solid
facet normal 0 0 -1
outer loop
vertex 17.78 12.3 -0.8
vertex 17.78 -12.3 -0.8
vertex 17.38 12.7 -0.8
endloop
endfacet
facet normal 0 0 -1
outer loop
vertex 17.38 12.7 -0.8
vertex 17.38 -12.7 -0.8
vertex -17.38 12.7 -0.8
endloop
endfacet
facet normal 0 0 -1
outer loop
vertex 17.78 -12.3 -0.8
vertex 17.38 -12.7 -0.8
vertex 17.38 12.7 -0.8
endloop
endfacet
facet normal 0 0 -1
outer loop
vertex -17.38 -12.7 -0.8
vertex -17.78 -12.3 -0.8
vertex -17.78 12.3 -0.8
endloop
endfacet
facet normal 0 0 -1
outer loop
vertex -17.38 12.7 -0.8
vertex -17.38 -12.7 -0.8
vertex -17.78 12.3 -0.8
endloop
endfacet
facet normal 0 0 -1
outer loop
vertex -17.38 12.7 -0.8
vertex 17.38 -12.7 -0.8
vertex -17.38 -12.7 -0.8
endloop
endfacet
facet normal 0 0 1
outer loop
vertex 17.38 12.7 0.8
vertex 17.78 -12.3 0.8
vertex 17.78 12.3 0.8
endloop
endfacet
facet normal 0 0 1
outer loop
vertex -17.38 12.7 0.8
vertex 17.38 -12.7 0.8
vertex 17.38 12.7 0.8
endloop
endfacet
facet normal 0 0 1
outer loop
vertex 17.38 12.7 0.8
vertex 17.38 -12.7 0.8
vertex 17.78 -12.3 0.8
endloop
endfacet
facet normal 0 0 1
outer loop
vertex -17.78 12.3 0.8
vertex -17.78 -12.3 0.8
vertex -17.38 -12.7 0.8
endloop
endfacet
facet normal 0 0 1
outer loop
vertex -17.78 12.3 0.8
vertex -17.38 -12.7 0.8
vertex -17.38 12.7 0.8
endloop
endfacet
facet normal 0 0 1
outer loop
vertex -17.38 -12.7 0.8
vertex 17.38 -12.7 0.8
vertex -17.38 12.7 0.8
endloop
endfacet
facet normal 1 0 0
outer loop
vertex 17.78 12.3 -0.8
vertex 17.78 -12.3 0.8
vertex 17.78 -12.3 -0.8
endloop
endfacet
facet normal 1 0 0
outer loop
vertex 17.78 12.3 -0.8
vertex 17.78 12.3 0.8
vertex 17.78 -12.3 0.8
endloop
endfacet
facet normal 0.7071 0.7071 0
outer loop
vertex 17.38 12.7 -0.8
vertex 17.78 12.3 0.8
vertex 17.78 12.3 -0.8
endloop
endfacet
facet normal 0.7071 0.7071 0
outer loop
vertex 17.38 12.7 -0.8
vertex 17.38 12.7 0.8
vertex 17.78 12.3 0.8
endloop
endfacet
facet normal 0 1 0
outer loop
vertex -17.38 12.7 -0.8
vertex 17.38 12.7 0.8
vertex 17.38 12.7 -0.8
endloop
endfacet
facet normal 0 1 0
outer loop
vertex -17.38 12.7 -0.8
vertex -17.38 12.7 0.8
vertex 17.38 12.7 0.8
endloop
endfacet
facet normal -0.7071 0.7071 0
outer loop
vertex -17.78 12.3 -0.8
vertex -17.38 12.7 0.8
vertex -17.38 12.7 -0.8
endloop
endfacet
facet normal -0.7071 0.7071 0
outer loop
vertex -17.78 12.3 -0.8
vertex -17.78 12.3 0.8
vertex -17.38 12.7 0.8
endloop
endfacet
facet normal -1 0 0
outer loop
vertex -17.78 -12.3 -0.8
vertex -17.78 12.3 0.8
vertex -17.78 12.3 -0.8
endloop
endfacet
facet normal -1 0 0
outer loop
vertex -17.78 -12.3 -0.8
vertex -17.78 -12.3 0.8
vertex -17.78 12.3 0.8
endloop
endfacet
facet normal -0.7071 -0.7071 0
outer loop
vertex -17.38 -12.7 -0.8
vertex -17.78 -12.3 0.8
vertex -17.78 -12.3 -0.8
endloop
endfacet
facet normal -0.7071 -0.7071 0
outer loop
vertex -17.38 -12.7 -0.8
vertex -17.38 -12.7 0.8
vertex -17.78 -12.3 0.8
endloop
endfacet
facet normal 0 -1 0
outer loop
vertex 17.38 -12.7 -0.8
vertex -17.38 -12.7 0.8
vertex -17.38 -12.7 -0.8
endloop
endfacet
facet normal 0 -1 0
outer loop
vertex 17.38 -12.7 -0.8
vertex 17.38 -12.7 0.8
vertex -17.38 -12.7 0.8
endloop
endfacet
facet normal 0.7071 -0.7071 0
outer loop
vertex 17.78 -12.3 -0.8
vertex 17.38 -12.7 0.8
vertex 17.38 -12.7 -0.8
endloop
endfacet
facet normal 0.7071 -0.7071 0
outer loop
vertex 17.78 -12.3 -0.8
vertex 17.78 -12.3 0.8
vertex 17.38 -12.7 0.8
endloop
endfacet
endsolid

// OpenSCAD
// PCB: 35.56mm x 25.4mm x 1.6mm (single connected solid)
$fn = 64;

pcb_length    = 35.56;
pcb_width     = 25.4;
pcb_thickness = 1.6;

// Small edge chamfer to make the slab visibly "PCB-like" while keeping exact overall size
chamfer = 0.4; // mm (kept small vs thickness)

module pcb_blank(L, W, T, c) {
    // 2D profile with chamfered corners, then extrude to thickness
    linear_extrude(height=T, center=true)
        polygon(points=[
            [ -L/2 + c, -W/2 ],
            [  L/2 - c, -W/2 ],
            [  L/2,     -W/2 + c ],
            [  L/2,      W/2 - c ],
            [  L/2 - c,  W/2 ],
            [ -L/2 + c,  W/2 ],
            [ -L/2,      W/2 - c ],
            [ -L/2,     -W/2 + c ]
        ]);
}

pcb_blank(pcb_length, pcb_width, pcb_thickness, chamfer);
